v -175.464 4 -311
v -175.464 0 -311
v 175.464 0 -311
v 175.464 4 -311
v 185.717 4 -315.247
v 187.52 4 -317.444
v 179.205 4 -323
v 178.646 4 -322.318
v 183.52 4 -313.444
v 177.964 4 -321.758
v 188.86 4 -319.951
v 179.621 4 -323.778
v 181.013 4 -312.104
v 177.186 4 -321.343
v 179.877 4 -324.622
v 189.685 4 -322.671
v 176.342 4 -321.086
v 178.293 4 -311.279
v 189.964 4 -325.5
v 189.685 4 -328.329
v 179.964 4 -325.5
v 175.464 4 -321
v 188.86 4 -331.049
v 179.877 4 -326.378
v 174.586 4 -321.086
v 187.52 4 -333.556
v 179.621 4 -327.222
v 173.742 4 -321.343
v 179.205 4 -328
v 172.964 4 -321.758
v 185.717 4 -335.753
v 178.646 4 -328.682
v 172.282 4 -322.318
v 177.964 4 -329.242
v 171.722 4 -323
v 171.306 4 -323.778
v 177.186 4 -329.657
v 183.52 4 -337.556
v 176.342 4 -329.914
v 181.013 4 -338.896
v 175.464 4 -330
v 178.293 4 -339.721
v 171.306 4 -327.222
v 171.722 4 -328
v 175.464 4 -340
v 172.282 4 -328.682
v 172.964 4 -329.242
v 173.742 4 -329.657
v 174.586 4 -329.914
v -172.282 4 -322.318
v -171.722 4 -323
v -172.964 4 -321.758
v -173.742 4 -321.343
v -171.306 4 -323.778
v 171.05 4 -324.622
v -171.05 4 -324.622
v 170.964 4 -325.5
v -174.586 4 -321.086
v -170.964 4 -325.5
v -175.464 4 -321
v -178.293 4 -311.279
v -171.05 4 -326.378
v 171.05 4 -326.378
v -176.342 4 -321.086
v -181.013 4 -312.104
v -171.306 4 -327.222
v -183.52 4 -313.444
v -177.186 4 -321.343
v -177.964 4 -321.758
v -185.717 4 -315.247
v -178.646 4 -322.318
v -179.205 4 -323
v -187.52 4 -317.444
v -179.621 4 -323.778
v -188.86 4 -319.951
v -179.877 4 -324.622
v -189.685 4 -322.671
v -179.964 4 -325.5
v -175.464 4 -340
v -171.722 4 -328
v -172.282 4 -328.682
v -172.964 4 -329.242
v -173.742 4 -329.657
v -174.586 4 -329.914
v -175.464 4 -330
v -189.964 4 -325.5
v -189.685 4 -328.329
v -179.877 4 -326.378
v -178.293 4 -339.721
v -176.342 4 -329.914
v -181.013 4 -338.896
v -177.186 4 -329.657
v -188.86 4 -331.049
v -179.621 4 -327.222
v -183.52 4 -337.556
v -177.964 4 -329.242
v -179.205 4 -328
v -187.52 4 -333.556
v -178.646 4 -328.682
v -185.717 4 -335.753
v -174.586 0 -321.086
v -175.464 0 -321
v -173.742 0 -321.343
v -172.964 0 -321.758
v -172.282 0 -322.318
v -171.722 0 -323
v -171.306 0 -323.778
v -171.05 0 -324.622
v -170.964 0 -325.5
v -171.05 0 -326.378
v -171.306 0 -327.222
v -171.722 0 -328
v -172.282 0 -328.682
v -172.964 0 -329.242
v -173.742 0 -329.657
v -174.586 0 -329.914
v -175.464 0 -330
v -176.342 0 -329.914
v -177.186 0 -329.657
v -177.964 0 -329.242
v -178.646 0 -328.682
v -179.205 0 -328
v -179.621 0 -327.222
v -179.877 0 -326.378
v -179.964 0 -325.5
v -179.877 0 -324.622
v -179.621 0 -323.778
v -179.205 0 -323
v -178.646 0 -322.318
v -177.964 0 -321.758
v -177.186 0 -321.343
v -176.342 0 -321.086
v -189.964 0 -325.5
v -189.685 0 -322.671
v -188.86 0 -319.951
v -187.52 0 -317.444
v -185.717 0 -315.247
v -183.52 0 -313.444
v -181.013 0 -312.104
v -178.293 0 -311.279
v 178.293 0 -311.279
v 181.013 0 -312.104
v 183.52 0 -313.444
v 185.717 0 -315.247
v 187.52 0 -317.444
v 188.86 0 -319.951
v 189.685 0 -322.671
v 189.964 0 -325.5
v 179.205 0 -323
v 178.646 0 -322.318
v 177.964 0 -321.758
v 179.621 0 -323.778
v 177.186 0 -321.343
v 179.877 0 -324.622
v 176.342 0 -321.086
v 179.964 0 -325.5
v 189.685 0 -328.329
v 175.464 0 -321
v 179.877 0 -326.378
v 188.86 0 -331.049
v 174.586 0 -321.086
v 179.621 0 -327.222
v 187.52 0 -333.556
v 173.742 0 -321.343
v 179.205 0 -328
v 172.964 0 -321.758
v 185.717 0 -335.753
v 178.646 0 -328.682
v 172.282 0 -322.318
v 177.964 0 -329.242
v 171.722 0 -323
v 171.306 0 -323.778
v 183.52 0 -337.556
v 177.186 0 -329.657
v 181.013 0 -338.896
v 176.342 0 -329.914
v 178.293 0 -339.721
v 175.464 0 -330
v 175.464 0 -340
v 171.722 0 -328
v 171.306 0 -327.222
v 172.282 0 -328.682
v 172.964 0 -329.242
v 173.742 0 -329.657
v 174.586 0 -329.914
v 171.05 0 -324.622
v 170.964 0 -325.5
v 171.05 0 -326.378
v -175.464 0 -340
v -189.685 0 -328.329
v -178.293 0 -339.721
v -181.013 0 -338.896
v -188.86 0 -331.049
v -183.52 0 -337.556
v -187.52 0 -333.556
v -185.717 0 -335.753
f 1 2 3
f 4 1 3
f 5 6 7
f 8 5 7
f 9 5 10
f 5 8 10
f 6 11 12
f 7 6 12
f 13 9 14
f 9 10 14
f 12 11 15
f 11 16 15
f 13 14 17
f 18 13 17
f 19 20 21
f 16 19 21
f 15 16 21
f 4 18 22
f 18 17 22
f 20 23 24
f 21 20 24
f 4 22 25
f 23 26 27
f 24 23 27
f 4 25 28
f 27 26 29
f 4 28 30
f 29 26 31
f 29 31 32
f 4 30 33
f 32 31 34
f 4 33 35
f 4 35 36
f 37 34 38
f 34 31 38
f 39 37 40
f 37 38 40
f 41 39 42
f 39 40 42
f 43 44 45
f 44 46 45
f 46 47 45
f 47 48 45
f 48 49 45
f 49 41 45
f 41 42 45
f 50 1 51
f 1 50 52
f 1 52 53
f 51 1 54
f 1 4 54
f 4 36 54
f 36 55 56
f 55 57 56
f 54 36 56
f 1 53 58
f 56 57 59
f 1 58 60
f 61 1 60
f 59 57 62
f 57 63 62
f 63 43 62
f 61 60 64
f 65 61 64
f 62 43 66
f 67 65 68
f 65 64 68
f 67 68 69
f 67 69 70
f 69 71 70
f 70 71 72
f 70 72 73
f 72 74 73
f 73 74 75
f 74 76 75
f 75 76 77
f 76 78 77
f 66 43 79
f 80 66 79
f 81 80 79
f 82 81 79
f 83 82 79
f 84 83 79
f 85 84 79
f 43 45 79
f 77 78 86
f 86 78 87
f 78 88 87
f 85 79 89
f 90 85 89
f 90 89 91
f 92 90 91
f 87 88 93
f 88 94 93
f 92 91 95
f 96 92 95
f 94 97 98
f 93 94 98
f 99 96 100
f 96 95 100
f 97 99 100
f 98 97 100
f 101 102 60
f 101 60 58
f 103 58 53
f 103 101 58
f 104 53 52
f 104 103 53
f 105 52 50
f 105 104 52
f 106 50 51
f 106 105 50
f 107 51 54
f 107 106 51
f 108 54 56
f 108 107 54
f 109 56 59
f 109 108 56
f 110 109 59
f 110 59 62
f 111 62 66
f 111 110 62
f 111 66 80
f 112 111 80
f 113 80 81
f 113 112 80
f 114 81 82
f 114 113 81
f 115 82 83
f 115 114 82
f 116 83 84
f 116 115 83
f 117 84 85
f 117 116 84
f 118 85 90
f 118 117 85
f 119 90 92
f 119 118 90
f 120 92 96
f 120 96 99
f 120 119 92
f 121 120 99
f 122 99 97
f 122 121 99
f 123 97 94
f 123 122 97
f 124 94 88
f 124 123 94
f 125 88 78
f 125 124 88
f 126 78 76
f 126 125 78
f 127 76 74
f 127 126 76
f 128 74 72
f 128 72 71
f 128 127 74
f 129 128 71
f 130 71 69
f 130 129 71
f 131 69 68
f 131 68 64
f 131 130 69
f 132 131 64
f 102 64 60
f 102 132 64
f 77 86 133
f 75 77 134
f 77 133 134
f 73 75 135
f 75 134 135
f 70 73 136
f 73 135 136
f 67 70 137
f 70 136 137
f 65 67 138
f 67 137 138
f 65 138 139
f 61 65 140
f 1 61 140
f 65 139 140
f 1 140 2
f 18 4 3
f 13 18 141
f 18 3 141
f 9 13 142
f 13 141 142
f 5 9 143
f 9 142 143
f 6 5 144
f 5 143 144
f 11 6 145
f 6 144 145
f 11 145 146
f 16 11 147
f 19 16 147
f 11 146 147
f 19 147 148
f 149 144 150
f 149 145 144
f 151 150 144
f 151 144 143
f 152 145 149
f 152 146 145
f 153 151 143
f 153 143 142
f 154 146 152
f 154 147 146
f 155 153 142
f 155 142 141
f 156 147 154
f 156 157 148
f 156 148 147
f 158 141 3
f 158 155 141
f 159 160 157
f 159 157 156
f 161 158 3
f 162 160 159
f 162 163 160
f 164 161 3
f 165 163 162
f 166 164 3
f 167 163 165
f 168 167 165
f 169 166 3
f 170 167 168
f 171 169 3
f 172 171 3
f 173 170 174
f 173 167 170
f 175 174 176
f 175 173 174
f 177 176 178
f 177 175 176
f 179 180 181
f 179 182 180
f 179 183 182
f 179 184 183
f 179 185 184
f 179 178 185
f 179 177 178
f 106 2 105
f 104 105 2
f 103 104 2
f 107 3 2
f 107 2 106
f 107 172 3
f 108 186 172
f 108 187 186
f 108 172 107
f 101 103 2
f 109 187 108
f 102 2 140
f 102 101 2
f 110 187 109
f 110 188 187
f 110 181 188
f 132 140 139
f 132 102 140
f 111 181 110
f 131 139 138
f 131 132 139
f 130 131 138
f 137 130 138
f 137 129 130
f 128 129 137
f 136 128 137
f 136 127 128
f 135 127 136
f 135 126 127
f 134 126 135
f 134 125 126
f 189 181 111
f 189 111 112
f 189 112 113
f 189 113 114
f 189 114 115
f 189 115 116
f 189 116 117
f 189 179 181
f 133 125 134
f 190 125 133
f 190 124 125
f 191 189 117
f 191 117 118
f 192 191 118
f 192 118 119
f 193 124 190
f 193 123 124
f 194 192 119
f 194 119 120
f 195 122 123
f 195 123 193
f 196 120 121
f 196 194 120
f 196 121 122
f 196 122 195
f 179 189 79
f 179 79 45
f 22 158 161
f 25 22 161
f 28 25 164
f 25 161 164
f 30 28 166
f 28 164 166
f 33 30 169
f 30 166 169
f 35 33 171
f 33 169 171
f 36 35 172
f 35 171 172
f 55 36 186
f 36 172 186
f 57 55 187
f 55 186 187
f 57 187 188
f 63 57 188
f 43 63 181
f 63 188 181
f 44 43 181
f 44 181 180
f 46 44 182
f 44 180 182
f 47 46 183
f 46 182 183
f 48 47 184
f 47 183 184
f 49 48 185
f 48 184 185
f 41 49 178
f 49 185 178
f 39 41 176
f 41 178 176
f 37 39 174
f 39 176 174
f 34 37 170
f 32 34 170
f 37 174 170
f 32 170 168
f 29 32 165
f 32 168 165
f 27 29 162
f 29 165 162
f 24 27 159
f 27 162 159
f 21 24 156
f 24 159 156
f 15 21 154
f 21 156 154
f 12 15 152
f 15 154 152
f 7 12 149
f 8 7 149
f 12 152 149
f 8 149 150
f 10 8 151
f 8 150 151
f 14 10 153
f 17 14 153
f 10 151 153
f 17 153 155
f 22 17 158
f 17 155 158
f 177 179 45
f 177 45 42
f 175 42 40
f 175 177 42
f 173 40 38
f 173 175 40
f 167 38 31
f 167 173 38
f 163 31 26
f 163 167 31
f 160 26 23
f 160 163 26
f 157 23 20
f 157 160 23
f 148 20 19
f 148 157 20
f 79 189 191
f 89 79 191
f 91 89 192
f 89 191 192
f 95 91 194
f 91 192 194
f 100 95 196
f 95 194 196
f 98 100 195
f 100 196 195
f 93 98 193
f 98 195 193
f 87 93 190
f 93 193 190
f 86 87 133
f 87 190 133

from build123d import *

# Parameters (mm, degrees)
SKETCH1_R           = 4.5
SKETCH1_R_2         = 6.5
SKETCH1_R_3         = 1.75
BOSS_EXTRUDE1_DEPTH = 4
SKETCH2_R           = 2
CUT_EXTRUDE1_DEPTH  = 4
SKETCH3_R           = 2
CUT_EXTRUDE2_DEPTH  = 10
CUT_EXTRUDE3_START  = -10
CUT_EXTRUDE3_DEPTH  = 10


with BuildPart() as part:
    # Sketch1 → Boss-Extrude1 (new body)
    with BuildSketch(Plane(origin=(0, 0, 0), x_dir=(1, 0, 0), z_dir=(0, 1, 0))):
        with BuildLine():
            Line((-270, -14.5), (0, -14.5))
            Line((0, -14.5), (0, 340))
            Line((0, 340), (-175.463800793, 340))
            ThreePointArc((-175.463800793, 340), (-185.71684912, 335.753048327), (-189.963800793, 325.5))
            Line((-189.963800793, 325.5), (-189.963800793, 225.606590828))
            ThreePointArc((-189.963800793, 225.606590828), (-204.963800793, 210.606590828), (-189.963800793, 195.606590828))
            Line((-189.963800793, 195.606590828), (-189.963800793, 54.5))
            Line((-189.963800793, 54.5), (-229.963800793, 14.5))
            Line((-229.963800793, 14.5), (-270, 14.5))
            ThreePointArc((-270, 14.5), (-284.5, 0), (-270, -14.5))
        make_face()
        with Locations(Location((-270, 0, 0), (0, 0, 270))):
            Circle(SKETCH1_R, mode=Mode.SUBTRACT)
        with Locations(Location((-175.463800793, 325.5, 0), (0, 0, 270))):
            Circle(SKETCH1_R, mode=Mode.SUBTRACT)
        with Locations(Location((-189.963800793, 210.606590828, 0), (0, 0, 270))):
            Circle(SKETCH1_R_2, mode=Mode.SUBTRACT)
        with Locations(Location((-180.213800793, 210.606590828, 0), (0, 0, 270))):
            Circle(SKETCH1_R_3, mode=Mode.SUBTRACT)
        with Locations(Location((-189.963800793, 220.406590828, 0), (0, 0, 270))):
            Circle(SKETCH1_R_3, mode=Mode.SUBTRACT)
        with Locations(Location((-189.963800793, 200.806590828, 0), (0, 0, 270))):
            Circle(SKETCH1_R_3, mode=Mode.SUBTRACT)
        with Locations(Location((-199.713800793, 210.606590828, 0), (0, 0, 270))):
            Circle(SKETCH1_R_3, mode=Mode.SUBTRACT)
    boss_extrude1 = extrude(amount=BOSS_EXTRUDE1_DEPTH)

    # Mirror1: Boss-Extrude1 across plane
    add(boss_extrude1.mirror(Plane(origin=(0, 4, -340), x_dir=(0, 0, 1), z_dir=(-1, 0, 0))))

    # Sketch2 → Cut-Extrude1 (cut)
    with BuildSketch(Plane(origin=(0, 4, 0), x_dir=(1, 0, 0), z_dir=(0, 1, 0))):
        with Locations(Location((0, 305.5, 0), (0, 0, 270))):
            Circle(SKETCH2_R)
    extrude(amount=-CUT_EXTRUDE1_DEPTH, mode=Mode.SUBTRACT)

    # Sketch3 → Cut-Extrude2 (cut)
    with BuildSketch(Plane(origin=(0, 4, 0), x_dir=(1, 0, 0), z_dir=(0, 1, 0))):
        with Locations(Location((-170, 15.5, 0), (0, 0, 270))):
            Circle(SKETCH3_R)
        with Locations(Location((170, 15.5, 0), (0, 0, 270))):
            Circle(SKETCH3_R)
    extrude(amount=-CUT_EXTRUDE2_DEPTH, mode=Mode.SUBTRACT)

    # Sketch4 → Cut-Extrude3 (cut)
    with BuildSketch(Plane(origin=(0, 4, 0), x_dir=(1, 0, 0), z_dir=(0, 1, 0)).offset(CUT_EXTRUDE3_START)):
        with BuildLine():
            Line((-175.463800793, 311), (175.463800793, 311))
            ThreePointArc((175.463800793, 311), (185.71684912, 315.246951673), (189.963800793, 325.5))
            Line((189.963800793, 325.5), (382.257646385, 325.5))
            Line((382.257646385, 325.5), (382.257646385, -89.216188956))
            Line((382.257646385, -89.216188956), (-350.501872642, -89.216188956))
            Line((-350.501872642, -89.216188956), (-350.501872642, 325.5))
            Line((-350.501872642, 325.5), (-189.963800793, 325.5))
            ThreePointArc((-189.963800793, 325.5), (-185.71684912, 315.246951673), (-175.463800793, 311))
        make_face()
    extrude(amount=CUT_EXTRUDE3_DEPTH, mode=Mode.SUBTRACT)


solid = part.part
